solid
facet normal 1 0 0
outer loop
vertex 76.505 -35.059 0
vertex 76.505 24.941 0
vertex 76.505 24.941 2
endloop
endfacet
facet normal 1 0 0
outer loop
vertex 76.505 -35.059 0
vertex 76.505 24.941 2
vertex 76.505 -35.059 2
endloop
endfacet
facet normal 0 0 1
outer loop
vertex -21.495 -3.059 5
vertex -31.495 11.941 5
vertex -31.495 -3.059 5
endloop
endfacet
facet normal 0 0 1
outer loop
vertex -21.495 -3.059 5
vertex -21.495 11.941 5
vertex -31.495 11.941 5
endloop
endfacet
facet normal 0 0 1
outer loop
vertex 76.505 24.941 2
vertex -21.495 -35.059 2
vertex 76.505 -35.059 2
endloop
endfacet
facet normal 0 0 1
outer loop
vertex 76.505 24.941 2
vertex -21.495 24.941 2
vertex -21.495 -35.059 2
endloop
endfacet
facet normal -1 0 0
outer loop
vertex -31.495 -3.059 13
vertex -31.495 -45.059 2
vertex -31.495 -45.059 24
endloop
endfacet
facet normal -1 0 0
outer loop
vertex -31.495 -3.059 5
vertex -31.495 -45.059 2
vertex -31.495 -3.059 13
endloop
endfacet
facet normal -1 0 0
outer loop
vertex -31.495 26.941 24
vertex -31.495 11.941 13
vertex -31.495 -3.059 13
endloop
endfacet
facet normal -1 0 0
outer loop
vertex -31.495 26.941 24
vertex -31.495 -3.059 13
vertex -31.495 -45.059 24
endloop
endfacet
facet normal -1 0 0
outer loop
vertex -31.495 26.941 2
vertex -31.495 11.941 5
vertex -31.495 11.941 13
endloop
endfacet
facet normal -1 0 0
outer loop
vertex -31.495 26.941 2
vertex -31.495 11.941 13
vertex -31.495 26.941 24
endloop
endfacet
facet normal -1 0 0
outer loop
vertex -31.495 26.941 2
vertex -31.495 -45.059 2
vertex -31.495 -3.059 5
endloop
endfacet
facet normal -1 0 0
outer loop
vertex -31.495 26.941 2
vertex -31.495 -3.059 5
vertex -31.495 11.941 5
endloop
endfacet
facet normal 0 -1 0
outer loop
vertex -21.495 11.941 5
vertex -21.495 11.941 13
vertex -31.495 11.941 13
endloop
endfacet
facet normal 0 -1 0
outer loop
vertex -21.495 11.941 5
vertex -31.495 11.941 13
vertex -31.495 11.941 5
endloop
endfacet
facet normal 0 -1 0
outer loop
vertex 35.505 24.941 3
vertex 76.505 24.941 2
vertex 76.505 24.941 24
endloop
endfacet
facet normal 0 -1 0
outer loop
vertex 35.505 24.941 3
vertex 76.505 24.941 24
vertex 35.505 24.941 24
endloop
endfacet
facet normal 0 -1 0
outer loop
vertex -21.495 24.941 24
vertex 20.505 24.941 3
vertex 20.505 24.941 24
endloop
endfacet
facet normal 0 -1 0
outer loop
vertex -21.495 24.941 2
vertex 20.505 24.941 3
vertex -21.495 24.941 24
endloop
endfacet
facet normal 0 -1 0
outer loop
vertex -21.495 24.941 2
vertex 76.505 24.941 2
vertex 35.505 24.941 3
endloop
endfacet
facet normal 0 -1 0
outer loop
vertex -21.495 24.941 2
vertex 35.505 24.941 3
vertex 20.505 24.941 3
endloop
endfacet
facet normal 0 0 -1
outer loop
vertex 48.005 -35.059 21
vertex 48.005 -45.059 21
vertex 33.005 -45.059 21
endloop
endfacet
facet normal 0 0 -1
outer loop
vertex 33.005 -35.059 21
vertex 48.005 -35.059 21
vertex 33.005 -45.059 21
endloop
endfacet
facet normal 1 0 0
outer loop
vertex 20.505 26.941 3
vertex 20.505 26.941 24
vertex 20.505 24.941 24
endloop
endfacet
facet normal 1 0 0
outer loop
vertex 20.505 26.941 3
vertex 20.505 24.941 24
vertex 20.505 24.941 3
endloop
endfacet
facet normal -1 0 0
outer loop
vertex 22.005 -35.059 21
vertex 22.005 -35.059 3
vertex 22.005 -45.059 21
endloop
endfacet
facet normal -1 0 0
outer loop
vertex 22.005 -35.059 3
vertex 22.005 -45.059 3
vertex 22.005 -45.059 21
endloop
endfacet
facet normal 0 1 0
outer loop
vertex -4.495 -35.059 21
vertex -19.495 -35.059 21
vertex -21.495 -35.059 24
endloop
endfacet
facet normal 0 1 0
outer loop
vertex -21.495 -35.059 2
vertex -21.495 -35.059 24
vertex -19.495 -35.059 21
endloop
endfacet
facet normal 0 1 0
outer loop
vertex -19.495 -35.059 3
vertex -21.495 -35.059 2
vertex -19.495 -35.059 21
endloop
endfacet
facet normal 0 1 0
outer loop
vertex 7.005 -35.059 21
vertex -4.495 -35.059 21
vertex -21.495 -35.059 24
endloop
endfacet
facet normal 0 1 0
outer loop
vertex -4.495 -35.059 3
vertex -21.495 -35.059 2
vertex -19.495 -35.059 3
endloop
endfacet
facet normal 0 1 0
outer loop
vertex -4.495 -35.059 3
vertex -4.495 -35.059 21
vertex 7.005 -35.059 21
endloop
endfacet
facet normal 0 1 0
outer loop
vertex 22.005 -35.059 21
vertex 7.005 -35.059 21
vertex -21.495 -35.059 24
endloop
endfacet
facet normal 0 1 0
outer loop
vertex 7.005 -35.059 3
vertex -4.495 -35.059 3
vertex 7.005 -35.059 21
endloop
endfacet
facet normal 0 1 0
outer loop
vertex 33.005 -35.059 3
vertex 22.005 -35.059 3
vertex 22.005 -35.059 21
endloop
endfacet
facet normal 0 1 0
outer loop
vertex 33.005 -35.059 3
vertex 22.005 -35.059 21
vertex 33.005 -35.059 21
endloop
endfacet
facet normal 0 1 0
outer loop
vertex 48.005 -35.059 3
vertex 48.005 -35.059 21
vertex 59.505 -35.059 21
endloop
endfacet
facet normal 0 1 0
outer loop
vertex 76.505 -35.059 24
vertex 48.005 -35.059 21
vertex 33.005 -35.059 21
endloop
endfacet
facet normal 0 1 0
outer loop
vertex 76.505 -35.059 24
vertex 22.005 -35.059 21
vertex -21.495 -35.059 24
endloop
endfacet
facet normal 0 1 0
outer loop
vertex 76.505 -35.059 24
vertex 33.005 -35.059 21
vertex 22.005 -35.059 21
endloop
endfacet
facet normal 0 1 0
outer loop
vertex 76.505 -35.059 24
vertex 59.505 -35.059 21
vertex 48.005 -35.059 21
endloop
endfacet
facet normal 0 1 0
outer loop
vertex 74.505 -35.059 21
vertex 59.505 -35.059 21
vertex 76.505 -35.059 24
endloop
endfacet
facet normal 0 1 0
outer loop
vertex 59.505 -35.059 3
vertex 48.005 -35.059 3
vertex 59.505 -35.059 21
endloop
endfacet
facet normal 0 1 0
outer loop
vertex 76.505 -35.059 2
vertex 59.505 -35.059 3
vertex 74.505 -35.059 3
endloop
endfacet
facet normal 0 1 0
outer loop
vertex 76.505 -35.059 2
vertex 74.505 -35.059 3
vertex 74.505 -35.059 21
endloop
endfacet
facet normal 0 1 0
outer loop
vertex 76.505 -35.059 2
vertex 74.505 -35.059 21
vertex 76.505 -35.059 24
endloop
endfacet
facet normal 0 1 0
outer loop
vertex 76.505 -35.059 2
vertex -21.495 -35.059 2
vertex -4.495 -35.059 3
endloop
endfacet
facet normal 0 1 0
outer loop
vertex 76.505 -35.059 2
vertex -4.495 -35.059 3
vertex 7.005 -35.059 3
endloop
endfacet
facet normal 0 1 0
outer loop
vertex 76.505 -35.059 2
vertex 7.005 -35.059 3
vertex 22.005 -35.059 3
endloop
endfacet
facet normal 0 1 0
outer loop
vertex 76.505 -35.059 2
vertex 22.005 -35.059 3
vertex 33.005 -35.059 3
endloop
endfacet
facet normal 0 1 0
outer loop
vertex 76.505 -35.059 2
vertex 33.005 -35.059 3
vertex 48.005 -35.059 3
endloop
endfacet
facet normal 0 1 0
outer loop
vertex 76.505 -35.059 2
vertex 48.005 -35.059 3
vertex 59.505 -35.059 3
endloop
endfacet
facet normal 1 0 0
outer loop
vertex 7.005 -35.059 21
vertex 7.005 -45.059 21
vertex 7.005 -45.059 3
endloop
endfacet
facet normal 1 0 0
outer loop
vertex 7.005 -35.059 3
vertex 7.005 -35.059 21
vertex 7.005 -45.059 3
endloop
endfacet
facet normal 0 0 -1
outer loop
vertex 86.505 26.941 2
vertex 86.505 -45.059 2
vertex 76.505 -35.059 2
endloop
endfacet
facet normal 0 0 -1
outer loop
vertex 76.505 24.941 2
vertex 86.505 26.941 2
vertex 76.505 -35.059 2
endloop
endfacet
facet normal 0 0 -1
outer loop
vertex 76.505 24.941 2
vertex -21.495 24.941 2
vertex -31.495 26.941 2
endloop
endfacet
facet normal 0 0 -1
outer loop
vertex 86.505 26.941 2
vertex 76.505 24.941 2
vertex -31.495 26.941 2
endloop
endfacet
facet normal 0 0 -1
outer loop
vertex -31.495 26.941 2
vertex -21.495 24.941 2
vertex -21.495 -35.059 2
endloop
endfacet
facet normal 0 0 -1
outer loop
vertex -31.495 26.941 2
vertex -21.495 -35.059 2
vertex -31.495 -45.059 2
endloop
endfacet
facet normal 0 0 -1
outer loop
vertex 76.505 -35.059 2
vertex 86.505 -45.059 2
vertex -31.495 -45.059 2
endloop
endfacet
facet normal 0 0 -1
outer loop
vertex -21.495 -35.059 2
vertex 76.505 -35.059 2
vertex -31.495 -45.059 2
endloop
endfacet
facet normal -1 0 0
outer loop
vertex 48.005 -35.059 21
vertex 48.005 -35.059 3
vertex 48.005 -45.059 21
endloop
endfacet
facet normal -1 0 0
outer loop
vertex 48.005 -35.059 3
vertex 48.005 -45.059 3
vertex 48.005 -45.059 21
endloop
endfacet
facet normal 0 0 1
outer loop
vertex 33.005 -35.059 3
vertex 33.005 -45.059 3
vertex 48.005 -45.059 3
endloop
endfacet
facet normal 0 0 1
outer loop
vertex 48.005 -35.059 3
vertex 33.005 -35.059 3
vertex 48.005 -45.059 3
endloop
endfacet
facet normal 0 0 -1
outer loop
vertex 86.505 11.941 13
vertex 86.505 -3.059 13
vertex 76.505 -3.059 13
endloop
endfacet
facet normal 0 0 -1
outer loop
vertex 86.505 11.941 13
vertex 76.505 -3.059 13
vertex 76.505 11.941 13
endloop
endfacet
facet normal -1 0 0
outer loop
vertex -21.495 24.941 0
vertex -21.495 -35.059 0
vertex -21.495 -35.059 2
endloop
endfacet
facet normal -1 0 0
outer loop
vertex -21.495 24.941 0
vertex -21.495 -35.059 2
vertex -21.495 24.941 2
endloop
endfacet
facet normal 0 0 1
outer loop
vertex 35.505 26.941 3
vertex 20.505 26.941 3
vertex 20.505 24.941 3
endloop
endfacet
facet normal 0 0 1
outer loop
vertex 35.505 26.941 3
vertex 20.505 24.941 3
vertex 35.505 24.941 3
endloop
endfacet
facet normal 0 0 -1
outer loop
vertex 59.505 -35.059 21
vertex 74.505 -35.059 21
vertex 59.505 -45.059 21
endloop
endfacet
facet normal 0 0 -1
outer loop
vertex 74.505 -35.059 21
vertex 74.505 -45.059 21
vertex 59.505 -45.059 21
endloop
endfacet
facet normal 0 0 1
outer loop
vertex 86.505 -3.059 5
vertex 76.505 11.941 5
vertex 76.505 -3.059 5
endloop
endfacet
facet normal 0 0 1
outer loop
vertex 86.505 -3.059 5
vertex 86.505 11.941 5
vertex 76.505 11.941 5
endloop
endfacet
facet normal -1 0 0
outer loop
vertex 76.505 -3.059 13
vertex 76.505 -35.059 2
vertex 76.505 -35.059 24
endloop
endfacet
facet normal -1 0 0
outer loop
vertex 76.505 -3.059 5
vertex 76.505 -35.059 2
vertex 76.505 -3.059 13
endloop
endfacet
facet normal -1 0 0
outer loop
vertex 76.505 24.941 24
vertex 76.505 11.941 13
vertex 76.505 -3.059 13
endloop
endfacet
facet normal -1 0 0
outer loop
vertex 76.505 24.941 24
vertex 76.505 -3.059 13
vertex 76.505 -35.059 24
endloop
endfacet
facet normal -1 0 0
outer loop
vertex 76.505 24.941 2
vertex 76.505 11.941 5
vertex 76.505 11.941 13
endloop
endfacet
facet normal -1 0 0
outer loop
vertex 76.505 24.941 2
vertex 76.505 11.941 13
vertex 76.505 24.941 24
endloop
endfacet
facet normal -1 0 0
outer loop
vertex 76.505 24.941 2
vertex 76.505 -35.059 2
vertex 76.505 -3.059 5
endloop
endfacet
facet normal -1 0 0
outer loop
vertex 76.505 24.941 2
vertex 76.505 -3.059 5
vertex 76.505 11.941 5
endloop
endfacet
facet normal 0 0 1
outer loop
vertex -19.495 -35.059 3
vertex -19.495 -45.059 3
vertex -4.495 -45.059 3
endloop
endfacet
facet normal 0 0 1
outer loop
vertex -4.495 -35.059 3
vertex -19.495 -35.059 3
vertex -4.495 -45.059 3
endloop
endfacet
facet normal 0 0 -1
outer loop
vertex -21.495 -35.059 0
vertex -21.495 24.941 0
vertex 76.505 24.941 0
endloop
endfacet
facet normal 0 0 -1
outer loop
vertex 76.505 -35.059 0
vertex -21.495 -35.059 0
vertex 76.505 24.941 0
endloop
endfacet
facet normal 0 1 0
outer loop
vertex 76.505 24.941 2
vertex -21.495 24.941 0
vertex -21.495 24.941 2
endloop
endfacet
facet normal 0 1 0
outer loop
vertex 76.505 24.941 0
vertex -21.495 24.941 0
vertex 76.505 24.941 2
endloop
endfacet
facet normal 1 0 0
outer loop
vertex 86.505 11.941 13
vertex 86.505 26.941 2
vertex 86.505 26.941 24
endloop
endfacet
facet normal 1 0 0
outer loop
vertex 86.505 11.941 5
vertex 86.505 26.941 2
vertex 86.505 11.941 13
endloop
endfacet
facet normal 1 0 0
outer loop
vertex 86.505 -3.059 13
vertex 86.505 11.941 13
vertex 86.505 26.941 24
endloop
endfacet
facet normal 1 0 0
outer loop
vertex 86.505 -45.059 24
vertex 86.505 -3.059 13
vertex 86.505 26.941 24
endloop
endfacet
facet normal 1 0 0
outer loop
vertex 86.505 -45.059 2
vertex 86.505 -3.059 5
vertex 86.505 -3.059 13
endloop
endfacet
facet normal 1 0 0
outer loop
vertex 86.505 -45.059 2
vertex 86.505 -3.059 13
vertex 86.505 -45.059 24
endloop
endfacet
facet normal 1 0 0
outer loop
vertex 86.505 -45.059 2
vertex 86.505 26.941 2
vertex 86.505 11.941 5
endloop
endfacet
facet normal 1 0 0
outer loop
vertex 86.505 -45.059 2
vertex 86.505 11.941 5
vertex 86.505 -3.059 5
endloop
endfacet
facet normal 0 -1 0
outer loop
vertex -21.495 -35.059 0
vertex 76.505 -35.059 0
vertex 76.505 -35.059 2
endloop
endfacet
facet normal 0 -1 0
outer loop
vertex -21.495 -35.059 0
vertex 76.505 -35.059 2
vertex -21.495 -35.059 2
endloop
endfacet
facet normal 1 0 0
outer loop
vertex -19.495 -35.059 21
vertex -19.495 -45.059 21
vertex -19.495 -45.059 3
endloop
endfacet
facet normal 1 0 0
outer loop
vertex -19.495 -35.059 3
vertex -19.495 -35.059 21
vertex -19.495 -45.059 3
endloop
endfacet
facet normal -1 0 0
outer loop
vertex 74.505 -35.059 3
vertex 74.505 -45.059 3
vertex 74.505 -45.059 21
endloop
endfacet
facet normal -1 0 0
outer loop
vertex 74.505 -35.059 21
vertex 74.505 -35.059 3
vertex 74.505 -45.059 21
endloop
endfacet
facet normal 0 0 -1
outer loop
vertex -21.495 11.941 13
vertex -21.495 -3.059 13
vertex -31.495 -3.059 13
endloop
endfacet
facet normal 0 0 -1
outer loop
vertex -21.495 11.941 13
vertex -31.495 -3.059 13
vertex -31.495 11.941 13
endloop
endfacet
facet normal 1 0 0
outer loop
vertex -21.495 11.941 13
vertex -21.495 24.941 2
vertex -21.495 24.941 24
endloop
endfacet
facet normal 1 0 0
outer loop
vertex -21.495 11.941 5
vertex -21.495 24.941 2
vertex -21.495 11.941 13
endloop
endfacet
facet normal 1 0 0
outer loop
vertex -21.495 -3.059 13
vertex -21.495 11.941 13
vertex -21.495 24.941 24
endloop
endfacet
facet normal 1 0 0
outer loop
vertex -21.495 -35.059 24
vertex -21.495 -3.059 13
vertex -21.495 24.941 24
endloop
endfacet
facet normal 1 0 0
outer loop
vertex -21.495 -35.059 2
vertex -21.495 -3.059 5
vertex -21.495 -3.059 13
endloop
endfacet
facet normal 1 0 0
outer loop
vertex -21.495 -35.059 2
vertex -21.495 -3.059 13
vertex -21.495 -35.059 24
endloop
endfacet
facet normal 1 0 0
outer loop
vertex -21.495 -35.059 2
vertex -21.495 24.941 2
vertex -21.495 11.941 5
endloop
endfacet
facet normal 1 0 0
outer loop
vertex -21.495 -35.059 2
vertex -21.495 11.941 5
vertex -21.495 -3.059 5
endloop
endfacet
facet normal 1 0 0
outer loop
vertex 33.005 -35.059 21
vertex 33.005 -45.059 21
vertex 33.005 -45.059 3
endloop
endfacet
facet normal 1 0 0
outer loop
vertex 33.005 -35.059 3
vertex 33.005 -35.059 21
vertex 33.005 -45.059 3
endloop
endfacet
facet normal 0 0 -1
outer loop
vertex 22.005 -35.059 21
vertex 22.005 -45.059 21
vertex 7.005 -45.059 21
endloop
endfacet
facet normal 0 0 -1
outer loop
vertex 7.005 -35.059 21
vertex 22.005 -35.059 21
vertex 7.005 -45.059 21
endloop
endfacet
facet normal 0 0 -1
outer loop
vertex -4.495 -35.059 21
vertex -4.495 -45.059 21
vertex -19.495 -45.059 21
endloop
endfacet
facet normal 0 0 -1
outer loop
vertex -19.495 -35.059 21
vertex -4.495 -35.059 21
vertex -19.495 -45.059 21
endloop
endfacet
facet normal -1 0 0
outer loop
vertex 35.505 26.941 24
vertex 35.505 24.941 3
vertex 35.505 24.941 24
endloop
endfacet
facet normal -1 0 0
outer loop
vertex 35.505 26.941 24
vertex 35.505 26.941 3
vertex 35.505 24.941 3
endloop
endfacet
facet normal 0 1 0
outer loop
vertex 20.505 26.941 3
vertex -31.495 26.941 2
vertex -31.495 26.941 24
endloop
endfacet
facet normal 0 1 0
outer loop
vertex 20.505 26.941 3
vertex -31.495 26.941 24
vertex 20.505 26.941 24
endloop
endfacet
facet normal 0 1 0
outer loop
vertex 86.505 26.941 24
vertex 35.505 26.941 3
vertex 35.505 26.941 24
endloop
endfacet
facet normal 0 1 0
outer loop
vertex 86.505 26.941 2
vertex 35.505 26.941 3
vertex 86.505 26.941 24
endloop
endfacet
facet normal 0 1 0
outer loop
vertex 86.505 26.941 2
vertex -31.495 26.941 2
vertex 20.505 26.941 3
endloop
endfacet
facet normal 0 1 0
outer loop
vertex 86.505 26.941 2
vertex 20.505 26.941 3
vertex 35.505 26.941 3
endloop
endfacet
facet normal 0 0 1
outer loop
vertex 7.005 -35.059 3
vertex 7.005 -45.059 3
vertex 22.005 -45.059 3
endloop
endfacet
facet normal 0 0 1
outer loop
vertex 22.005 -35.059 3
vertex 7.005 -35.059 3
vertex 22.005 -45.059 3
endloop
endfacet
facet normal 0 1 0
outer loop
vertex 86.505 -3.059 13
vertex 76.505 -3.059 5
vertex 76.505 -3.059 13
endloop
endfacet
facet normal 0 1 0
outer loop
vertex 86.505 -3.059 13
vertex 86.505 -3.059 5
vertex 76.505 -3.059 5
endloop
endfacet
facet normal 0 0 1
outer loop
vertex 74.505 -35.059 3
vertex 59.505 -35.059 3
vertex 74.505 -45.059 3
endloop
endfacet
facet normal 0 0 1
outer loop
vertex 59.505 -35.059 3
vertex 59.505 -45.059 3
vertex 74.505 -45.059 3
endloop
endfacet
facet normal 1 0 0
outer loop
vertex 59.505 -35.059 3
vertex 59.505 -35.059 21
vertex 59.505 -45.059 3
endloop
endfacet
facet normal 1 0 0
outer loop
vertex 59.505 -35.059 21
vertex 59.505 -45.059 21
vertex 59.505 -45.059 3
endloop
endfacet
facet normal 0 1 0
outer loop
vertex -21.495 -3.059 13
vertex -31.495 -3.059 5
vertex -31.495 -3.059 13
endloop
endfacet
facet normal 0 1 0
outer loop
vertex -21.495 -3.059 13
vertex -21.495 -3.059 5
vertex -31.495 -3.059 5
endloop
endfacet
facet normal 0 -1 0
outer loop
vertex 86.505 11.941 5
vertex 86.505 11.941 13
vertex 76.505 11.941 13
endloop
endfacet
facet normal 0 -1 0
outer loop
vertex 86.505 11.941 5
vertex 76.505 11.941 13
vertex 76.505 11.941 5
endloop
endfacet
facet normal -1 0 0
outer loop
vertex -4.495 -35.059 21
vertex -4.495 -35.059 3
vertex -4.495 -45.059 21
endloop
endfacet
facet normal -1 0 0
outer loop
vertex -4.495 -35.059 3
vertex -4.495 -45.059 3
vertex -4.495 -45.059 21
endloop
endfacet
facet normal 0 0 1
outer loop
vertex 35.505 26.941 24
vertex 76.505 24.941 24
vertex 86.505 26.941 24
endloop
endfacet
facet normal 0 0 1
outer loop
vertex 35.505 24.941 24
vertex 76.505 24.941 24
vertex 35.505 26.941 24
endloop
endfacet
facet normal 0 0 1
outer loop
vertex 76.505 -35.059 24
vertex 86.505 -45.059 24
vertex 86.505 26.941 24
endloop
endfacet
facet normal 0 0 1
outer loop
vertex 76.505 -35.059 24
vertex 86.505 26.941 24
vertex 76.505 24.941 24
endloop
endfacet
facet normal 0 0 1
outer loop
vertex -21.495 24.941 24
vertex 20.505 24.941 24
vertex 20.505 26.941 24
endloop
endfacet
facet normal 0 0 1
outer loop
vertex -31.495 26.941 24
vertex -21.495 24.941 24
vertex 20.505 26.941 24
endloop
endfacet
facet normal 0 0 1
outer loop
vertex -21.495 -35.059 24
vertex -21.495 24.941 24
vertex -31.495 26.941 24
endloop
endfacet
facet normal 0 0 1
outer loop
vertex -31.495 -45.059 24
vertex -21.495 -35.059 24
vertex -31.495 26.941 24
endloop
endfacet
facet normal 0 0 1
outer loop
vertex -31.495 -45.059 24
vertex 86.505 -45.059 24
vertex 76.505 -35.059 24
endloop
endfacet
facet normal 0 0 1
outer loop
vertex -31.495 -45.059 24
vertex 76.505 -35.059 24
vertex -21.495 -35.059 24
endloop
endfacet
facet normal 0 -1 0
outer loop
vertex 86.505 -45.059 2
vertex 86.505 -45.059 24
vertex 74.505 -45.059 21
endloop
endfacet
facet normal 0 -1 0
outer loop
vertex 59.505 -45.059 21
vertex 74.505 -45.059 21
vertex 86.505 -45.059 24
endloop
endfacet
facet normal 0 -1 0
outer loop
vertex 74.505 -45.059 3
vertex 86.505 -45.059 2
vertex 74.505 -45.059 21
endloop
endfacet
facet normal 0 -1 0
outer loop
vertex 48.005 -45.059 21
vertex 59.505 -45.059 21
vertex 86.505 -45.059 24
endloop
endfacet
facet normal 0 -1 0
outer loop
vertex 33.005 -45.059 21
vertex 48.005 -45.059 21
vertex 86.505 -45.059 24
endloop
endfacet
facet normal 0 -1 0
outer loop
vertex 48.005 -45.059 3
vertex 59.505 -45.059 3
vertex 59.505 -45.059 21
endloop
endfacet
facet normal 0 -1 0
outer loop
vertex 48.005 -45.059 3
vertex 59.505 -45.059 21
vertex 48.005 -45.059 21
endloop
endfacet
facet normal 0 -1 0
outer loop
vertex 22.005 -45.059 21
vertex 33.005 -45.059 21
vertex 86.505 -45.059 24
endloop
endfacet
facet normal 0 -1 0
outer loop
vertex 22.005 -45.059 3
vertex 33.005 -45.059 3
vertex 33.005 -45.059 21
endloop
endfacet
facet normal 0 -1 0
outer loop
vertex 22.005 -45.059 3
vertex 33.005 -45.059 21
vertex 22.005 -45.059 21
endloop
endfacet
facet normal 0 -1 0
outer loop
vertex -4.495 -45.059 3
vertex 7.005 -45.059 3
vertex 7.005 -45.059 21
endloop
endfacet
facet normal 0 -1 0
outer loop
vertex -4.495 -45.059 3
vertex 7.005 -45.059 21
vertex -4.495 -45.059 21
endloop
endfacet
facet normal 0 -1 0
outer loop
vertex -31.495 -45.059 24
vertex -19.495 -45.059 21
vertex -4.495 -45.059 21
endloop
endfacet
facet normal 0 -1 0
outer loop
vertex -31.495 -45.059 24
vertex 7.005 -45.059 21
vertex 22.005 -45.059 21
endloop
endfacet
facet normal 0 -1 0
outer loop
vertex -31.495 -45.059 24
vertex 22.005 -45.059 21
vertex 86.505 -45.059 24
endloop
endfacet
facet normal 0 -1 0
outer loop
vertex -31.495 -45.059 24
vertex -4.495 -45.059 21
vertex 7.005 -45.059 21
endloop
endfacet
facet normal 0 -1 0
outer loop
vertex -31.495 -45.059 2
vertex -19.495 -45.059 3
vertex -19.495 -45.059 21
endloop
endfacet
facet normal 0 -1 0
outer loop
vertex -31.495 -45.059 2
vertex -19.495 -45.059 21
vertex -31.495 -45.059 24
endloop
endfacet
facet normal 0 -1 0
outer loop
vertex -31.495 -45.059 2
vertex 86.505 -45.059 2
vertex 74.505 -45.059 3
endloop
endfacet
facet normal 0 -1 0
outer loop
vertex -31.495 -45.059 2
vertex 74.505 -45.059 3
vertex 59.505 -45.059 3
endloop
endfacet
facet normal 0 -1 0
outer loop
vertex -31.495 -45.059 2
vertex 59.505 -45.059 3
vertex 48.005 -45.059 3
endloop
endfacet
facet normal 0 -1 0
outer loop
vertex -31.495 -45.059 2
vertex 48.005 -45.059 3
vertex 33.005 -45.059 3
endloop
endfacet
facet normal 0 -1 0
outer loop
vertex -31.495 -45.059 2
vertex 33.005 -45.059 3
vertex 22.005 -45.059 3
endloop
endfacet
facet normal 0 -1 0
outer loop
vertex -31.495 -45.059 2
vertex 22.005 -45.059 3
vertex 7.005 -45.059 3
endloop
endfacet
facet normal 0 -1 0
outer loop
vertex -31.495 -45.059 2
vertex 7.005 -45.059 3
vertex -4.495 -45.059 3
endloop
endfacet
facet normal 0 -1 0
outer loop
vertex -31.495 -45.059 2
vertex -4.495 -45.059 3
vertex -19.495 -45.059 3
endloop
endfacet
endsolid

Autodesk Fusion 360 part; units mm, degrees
sketch "Sketch1" plane through (0, 0, 0) normal (0, 0, 1) x (1, 0, 0)
  line L0 (-21.4951, 24.9409) -> (76.5049, 24.9409)
  line L1 (76.5049, 24.9409) -> (76.5049, -35.0591)
  line L2 (76.5049, -35.0591) -> (-21.4951, -35.0591)
  line L3 (-21.4951, -35.0591) -> (-21.4951, 24.9409)
  dimension "d1" = 98
  dimension "d2" = 60
extrude "Extrude1" add sketch "Sketch1" along normal blind 2 makes body 1
sketch "Sketch2" plane through (0, 0, 2) normal (0, 0, 1) x (-1, 0, 0)
  line L0 (21.4951, 35.0591) -> (-76.5049, 35.0591)
  line L1 (-76.5049, 35.0591) -> (-76.5049, -24.9409)
  line L2 (-76.5049, -24.9409) -> (21.4951, -24.9409)
  line L3 (21.4951, -24.9409) -> (21.4951, 35.0591)
  line L4 (31.4951, -26.9409) -> (-86.5049, -26.9409)
  line L5 (-86.5049, -26.9409) -> (-86.5049, 45.0591)
  line L6 (-86.5049, 45.0591) -> (31.4951, 45.0591)
  line L7 (31.4951, 45.0591) -> (31.4951, -26.9409)
  dimension "d5" = 118
  dimension "d6" = 72
  dimension "d8" = 10
  dimension "d40" = 10
extrude "Extrude2" add sketch "Sketch2" along normal blind 42 separate body makes body 2
extrude "Extrude3" cut 1 faces at (43.8383, -41.7258, 44) along direction (0, 0, -1) blind 20 on bodies 2 bodies 2
sketch "Sketch3" plane through (0, -45.0591, 0) normal (0, -1, 0) x (1, 0, 0)
  line L0 (86.5049, 24) -> (-31.4951, 24)
  line L1 (-31.4951, 24) -> (-31.4951, 2)
  line L2 (-31.4951, 2) -> (86.5049, 2)
  line L3 (86.5049, 2) -> (86.5049, 24)
  line L4 (-19.4951, 3) -> (-4.4951, 3)
  line L5 (-4.4951, 3) -> (-4.4951, 21)
  line L6 (-4.4951, 21) -> (-19.4951, 21)
  line L7 (-19.4951, 21) -> (-19.4951, 3)
  line L8 (22.0049, 3) -> (22.0049, 21)
  line L9 (22.0049, 21) -> (7.0049, 21)
  line L10 (7.0049, 21) -> (7.0049, 3)
  line L11 (7.0049, 3) -> (22.0049, 3)
  line L12 (48.0049, 3) -> (48.0049, 21)
  line L13 (33.0049, 3) -> (48.0049, 3)
  line L14 (59.5049, 21) -> (59.5049, 3)
  line L15 (59.5049, 3) -> (74.5049, 3)
  line L16 (74.5049, 3) -> (74.5049, 21)
  line L17 (48.0049, 21) -> (33.0049, 21)
  line L18 (74.5049, 21) -> (59.5049, 21)
  line L19 (33.0049, 21) -> (33.0049, 3)
  dimension "d13" = 15
  dimension "d14" = 18
  dimension "d15" = 1
  dimension "d16" = 12
  dimension "d17" = 15
  dimension "d18" = 18
  dimension "d19" = 11.5
  dimension "d20" = 15
  dimension "d21" = 18
  dimension "d22" = 15
  dimension "d23" = 18
  dimension "d24" = 11.5
  dimension "d25" = 11
extrude "Extrude4" cut sketch "Sketch3" against normal blind 10 contours L4 L5 L6 L7 | L8 L9 L10 L11 | L12 L13 L17 L19 | L14 L15 L16 L18 bodies 2
sketch "Sketch4" plane through (86.5049, 0, 0) normal (1, 0, 0) x (0, 1, 0)
  line L0 (26.9409, 24) -> (-45.0591, 24)
  line L1 (-45.0591, 24) -> (-45.0591, 2)
  line L2 (-45.0591, 2) -> (26.9409, 2)
  line L3 (26.9409, 2) -> (26.9409, 24)
  line L4 (-3.0591, 13) -> (11.9409, 13)
  line L5 (11.9409, 13) -> (11.9409, 5)
  line L6 (11.9409, 5) -> (-3.0591, 5)
  line L7 (-3.0591, 5) -> (-3.0591, 13)
  dimension "d28" = 15
  dimension "d29" = 8
  dimension "d30" = 15
  dimension "d33" = 3
extrude "Extrude5" cut sketch "Sketch4" against normal blind 120 contours L4 L5 L6 L7 bodies 2
sketch "Sketch5" plane through (0, 26.9409, 0) normal (0, 1, 0) x (-1, 0, 0)
  line L0 (31.4951, 24) -> (-86.5049, 24)
  line L1 (-86.5049, 24) -> (-86.5049, 2)
  line L2 (-86.5049, 2) -> (31.4951, 2)
  line L3 (31.4951, 2) -> (31.4951, 24)
  line L4 (-35.5049, 83) -> (-20.5049, 83)
  line L5 (-20.5049, 83) -> (-20.5049, 3)
  line L6 (-20.5049, 3) -> (-35.5049, 3)
  line L7 (-35.5049, 3) -> (-35.5049, 83)
  dimension "d34" = 15
  dimension "d35" = 80
  dimension "d36" = 1
  dimension "d37" = 52
extrude "Extrude6" cut sketch "Sketch5" against normal blind 10 contours L0 L5 L6 L7 | L0 L4 L5 L7 bodies 2
